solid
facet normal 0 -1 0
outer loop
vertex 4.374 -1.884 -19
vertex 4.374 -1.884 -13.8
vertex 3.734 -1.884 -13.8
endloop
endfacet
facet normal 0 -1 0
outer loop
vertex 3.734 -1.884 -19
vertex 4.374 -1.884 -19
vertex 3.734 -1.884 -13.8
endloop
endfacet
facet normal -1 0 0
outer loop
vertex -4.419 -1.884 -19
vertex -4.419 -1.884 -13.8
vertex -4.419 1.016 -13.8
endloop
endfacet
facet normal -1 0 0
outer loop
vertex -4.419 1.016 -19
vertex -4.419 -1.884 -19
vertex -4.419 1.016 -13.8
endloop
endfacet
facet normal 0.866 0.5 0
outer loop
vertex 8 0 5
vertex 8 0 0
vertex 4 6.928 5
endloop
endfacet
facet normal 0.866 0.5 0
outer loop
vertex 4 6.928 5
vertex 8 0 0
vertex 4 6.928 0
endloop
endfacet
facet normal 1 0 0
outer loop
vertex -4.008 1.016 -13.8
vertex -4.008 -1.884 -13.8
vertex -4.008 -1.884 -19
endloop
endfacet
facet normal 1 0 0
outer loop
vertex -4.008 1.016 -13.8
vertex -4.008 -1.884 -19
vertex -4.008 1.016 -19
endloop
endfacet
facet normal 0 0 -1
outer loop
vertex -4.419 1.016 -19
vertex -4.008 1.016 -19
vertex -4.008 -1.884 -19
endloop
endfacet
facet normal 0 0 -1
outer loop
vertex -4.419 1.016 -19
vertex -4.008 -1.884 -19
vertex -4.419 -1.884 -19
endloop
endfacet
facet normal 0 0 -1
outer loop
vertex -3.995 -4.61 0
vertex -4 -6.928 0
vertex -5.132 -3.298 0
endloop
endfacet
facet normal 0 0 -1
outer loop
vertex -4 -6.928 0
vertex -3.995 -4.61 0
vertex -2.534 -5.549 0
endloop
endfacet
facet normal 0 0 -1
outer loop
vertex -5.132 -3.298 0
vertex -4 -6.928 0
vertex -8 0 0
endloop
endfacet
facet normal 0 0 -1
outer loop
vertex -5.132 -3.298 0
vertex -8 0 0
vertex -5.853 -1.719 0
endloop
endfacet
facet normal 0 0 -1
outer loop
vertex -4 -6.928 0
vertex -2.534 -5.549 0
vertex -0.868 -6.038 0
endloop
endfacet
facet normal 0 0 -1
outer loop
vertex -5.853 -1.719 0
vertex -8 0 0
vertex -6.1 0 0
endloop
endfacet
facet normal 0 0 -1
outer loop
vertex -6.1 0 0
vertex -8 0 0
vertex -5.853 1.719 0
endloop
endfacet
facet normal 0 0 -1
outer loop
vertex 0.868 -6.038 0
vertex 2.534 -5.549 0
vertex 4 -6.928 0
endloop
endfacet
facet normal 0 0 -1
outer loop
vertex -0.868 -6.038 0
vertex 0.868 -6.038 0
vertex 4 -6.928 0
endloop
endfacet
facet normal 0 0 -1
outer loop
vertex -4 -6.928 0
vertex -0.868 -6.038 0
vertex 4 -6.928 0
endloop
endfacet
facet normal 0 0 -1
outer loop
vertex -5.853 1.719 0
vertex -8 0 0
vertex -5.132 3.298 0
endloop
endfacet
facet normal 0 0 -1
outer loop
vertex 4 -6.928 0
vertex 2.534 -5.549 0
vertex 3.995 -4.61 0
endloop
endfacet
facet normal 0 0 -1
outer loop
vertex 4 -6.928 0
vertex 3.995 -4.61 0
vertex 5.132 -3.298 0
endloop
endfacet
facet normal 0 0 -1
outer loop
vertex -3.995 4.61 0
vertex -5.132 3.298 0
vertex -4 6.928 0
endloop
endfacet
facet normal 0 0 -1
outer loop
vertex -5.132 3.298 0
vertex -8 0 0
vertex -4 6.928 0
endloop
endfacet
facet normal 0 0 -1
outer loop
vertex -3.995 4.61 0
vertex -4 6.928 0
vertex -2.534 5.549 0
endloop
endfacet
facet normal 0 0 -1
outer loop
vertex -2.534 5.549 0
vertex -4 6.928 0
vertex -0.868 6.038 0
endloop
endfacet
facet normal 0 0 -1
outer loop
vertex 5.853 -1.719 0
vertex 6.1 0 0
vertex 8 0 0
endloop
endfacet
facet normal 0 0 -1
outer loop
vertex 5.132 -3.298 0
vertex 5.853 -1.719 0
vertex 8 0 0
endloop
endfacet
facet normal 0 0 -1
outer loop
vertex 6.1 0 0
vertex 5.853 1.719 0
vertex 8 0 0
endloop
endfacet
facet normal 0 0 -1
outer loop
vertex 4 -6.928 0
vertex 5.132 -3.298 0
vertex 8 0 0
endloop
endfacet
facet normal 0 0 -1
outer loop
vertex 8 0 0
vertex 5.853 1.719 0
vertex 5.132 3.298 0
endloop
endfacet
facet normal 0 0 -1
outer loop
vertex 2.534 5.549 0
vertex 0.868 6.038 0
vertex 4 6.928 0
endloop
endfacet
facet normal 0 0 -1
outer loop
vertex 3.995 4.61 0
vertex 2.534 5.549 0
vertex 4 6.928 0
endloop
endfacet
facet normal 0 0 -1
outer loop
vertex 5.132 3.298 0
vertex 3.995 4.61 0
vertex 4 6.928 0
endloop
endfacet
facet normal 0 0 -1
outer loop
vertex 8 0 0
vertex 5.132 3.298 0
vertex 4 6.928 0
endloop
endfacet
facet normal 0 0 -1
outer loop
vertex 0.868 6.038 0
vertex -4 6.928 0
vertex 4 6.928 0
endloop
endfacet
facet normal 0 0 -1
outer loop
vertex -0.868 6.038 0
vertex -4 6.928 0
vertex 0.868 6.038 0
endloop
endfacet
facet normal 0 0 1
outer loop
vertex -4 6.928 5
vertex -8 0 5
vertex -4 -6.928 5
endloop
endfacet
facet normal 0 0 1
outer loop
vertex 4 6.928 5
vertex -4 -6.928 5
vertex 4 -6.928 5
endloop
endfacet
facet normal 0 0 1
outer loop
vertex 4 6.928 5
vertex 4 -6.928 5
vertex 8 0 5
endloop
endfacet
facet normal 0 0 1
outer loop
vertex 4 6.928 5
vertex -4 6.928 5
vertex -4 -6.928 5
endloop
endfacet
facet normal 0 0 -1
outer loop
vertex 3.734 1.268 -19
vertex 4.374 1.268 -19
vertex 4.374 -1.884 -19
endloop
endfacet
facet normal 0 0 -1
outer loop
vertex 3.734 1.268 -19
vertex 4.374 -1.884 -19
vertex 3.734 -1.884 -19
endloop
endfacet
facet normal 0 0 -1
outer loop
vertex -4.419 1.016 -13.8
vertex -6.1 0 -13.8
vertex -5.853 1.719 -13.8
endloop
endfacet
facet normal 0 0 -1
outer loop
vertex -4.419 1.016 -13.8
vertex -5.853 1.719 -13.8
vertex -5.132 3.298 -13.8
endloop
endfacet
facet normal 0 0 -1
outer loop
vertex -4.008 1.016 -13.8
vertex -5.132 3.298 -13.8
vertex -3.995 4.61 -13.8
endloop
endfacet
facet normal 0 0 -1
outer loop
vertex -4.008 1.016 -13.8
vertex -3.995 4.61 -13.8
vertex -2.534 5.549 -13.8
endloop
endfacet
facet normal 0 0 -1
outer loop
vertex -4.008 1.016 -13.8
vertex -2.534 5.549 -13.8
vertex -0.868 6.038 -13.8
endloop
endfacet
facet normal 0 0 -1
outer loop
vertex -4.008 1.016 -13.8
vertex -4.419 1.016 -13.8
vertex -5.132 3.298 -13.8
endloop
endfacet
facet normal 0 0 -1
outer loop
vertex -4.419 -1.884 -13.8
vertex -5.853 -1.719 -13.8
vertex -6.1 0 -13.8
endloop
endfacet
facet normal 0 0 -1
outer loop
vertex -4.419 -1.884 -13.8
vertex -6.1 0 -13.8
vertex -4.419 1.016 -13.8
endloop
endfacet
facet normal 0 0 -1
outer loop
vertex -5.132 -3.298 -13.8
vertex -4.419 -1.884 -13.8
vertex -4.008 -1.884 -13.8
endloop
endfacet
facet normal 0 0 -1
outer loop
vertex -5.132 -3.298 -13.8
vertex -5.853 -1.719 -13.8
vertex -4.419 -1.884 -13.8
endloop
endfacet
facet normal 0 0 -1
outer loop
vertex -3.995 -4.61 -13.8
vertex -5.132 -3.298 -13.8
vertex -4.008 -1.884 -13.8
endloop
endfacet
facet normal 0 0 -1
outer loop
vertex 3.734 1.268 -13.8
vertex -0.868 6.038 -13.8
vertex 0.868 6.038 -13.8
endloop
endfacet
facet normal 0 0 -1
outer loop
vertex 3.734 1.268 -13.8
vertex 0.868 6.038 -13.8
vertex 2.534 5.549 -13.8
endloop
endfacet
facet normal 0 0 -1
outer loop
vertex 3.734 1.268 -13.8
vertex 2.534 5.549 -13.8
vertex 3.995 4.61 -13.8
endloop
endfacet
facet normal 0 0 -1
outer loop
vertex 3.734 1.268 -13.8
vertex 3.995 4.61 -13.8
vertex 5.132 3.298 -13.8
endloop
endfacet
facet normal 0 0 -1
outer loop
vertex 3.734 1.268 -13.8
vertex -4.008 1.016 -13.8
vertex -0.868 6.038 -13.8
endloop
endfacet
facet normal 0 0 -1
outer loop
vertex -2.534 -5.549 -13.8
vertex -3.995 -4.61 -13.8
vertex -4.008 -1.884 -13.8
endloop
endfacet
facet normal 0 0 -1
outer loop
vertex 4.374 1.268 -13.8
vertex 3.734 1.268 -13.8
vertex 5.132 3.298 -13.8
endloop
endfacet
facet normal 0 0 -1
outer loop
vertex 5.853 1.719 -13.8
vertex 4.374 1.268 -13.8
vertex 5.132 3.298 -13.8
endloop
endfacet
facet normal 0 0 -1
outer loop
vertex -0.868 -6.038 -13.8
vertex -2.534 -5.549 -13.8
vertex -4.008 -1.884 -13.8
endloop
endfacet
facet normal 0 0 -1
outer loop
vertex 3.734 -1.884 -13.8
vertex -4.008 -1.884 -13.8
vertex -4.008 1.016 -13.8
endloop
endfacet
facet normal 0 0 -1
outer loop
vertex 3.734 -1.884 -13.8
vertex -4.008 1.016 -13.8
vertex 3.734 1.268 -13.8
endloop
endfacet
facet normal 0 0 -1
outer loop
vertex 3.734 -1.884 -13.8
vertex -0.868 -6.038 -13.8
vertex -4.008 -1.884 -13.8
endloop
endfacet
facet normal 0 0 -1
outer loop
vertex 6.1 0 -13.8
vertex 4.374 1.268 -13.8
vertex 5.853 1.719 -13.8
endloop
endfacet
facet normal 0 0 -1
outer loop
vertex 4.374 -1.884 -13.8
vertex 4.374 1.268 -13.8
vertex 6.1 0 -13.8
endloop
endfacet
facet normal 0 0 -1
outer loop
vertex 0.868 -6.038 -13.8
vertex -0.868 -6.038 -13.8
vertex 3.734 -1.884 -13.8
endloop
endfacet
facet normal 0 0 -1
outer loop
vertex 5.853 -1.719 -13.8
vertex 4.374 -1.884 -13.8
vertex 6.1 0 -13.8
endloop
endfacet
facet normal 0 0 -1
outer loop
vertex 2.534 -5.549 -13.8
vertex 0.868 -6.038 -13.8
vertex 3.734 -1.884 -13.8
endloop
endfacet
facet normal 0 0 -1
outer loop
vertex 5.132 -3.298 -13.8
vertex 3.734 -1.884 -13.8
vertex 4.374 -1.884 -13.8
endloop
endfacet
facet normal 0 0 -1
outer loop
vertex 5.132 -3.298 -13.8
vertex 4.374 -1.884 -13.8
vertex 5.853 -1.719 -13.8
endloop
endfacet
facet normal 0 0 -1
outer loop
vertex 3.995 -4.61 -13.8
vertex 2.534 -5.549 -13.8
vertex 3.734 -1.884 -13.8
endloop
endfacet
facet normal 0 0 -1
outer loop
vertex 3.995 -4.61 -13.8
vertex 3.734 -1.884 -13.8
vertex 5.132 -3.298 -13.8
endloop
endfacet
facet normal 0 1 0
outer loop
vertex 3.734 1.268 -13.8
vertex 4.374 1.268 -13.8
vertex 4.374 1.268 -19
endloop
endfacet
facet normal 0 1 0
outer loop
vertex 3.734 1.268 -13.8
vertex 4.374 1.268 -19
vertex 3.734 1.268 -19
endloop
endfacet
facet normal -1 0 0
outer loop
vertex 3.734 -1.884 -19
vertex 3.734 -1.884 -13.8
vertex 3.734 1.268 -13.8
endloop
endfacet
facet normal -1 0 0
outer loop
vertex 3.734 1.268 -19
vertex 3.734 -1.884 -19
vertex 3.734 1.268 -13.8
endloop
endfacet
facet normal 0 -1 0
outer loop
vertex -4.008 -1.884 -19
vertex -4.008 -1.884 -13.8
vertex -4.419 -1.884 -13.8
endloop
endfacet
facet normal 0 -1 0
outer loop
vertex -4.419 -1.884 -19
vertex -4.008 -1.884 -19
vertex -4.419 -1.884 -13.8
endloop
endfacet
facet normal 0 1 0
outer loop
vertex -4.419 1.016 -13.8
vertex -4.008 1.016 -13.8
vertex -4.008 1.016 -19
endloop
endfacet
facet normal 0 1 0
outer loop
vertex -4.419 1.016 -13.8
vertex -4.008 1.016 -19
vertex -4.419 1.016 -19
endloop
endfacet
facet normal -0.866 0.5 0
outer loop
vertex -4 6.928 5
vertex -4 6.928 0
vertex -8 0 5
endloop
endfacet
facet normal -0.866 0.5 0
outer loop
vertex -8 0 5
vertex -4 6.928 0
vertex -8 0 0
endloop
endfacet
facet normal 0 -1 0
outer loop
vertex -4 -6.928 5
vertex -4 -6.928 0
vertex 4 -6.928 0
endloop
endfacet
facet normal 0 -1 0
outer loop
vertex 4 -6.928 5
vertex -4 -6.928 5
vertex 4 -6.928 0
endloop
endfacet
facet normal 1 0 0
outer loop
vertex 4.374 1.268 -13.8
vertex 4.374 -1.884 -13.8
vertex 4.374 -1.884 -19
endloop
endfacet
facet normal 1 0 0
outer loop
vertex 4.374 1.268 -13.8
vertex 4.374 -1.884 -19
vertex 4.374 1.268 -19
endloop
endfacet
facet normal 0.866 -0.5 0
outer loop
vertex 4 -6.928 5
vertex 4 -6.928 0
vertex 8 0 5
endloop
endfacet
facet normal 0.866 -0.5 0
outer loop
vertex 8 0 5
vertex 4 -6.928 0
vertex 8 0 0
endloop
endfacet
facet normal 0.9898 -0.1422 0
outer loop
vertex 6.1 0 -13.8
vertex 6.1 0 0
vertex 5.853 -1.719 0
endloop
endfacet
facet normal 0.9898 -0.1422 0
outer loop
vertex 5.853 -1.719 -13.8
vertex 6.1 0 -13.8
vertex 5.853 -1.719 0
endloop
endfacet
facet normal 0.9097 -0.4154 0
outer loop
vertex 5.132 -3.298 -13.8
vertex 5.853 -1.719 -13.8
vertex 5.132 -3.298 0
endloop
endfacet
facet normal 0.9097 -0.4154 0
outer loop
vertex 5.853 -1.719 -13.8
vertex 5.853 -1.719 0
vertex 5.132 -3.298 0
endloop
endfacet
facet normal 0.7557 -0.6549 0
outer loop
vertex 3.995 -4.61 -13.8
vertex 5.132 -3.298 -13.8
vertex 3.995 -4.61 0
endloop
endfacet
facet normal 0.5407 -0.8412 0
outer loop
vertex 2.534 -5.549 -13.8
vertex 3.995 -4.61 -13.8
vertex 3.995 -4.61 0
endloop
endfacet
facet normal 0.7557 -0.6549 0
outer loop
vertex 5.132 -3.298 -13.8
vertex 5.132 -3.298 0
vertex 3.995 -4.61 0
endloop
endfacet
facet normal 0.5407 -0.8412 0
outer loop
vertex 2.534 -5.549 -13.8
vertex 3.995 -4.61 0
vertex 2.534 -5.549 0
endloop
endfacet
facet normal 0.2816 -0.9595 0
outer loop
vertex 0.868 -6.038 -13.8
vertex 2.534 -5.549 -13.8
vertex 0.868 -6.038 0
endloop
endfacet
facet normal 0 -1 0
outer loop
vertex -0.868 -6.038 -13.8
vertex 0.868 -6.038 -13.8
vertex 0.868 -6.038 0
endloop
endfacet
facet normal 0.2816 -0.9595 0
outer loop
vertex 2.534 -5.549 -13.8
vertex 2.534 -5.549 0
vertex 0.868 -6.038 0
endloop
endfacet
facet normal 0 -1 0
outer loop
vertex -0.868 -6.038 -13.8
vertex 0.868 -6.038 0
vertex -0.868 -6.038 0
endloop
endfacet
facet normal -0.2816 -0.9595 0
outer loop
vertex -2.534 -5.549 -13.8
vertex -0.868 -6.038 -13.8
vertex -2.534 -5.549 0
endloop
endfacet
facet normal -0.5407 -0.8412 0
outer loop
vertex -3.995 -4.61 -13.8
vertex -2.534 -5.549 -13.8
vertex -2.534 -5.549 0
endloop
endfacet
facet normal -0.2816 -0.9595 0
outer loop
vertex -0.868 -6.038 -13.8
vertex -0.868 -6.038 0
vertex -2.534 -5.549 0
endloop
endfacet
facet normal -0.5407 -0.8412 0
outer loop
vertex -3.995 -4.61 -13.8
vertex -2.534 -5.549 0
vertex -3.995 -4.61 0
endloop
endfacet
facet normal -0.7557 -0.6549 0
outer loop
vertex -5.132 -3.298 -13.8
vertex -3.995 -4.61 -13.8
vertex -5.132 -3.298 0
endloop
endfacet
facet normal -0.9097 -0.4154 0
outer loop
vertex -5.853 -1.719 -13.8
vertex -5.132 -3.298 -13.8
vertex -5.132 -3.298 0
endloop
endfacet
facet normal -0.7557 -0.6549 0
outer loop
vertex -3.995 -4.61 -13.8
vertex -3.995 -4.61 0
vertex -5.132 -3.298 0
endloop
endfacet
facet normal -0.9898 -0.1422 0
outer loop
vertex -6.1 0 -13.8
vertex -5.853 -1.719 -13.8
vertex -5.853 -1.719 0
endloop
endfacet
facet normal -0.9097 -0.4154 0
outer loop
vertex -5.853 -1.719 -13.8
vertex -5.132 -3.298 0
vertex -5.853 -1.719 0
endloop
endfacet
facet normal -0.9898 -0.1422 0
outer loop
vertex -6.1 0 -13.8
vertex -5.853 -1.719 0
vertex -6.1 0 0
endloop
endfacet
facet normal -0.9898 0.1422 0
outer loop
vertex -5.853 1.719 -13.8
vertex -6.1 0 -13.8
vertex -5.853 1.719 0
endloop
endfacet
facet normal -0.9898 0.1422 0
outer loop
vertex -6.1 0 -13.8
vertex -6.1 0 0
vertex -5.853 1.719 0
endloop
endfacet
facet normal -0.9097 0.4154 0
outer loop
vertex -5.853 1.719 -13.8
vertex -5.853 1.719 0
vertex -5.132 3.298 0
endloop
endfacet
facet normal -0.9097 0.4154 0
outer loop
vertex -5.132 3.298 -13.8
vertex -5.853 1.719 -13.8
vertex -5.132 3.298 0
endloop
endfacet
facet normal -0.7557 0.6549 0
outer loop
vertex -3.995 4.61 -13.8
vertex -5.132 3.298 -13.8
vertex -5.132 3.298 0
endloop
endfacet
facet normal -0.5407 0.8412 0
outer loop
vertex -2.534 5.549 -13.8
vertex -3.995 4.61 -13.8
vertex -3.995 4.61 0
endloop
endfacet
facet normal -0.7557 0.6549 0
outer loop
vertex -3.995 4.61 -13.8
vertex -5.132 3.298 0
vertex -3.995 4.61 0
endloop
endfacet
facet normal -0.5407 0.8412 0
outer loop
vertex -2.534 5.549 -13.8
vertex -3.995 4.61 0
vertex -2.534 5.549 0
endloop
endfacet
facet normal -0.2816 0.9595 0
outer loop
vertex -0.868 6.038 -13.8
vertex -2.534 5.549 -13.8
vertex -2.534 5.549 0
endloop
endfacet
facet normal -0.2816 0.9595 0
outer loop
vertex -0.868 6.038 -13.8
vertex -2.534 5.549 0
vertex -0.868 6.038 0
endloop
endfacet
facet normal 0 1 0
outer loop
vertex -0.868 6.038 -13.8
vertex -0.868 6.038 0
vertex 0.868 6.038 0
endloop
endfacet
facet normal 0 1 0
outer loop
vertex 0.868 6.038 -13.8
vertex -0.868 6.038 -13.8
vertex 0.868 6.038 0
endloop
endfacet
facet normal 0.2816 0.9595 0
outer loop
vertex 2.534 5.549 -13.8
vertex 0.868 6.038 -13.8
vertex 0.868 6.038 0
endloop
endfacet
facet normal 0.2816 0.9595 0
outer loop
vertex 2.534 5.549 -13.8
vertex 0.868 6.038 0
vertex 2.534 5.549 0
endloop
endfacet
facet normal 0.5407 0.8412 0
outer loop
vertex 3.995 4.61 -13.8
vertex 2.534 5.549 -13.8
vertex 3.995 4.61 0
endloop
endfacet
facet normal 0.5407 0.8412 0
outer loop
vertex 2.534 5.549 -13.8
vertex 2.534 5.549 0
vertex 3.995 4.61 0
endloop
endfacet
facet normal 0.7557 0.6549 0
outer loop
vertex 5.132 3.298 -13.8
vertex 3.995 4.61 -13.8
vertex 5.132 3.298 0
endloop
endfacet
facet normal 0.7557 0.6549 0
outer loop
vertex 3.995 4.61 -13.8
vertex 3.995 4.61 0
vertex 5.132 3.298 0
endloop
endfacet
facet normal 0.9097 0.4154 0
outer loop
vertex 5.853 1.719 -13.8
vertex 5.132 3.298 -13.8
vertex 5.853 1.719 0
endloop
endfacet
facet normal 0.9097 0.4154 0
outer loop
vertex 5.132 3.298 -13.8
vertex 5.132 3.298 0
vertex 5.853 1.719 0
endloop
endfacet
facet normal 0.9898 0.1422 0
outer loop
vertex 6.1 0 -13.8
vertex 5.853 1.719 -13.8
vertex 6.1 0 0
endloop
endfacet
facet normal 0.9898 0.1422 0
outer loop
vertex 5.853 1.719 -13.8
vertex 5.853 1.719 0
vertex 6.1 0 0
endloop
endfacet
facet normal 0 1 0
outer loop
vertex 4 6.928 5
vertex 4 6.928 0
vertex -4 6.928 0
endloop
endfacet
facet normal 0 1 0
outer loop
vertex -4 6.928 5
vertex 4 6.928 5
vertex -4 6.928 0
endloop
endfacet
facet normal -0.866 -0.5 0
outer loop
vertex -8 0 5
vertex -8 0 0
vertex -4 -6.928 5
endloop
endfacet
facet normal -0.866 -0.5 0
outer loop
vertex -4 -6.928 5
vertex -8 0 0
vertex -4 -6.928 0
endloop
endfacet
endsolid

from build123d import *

# Parameters (mm, degrees)
EXTRUDE_1_DEPTH = 5
SKETCH_2_R      = 6.1
EXTRUDE_2_DEPTH = 13.8
SKETCH_3_W      = 0.639470974
SKETCH_3_H      = 3.15167837
SKETCH_3_W_2    = 0.411088483
SKETCH_3_H_2    = 2.90045763
EXTRUDE_3_DEPTH = 5.2


with BuildPart() as part:
    # 草图1 → 凸台-拉伸1 (new body)
    with BuildSketch(Plane.XY):
        Polygon((8, 0), (4, 6.92820323), (-4, 6.92820323), (-8, 0), (-4, -6.92820323), (4, -6.92820323), align=None)
    extrude(amount=EXTRUDE_1_DEPTH)

    # 草图2 → 凸台-拉伸2 (add)
    with BuildSketch(Plane(origin=(0, 0, 0), x_dir=(-1, 0, 0), z_dir=(0, 0, -1))):
        with Locations(Location((0, 0, 0), (0, 0, 180))):
            Circle(SKETCH_2_R)
    extrude(amount=EXTRUDE_2_DEPTH)

    # 草图3 → 凸台-拉伸3 (add)
    with BuildSketch(Plane(origin=(0, 0, -13.8), x_dir=(-1, 0, 0), z_dir=(0, 0, -1))):
        with Locations((-4.053789208, -0.308316362)):
            Rectangle(SKETCH_3_W, SKETCH_3_H)
        with Locations((4.213656952, -0.433926732)):
            Rectangle(SKETCH_3_W_2, SKETCH_3_H_2)
    extrude(amount=EXTRUDE_3_DEPTH)


solid = part.part
